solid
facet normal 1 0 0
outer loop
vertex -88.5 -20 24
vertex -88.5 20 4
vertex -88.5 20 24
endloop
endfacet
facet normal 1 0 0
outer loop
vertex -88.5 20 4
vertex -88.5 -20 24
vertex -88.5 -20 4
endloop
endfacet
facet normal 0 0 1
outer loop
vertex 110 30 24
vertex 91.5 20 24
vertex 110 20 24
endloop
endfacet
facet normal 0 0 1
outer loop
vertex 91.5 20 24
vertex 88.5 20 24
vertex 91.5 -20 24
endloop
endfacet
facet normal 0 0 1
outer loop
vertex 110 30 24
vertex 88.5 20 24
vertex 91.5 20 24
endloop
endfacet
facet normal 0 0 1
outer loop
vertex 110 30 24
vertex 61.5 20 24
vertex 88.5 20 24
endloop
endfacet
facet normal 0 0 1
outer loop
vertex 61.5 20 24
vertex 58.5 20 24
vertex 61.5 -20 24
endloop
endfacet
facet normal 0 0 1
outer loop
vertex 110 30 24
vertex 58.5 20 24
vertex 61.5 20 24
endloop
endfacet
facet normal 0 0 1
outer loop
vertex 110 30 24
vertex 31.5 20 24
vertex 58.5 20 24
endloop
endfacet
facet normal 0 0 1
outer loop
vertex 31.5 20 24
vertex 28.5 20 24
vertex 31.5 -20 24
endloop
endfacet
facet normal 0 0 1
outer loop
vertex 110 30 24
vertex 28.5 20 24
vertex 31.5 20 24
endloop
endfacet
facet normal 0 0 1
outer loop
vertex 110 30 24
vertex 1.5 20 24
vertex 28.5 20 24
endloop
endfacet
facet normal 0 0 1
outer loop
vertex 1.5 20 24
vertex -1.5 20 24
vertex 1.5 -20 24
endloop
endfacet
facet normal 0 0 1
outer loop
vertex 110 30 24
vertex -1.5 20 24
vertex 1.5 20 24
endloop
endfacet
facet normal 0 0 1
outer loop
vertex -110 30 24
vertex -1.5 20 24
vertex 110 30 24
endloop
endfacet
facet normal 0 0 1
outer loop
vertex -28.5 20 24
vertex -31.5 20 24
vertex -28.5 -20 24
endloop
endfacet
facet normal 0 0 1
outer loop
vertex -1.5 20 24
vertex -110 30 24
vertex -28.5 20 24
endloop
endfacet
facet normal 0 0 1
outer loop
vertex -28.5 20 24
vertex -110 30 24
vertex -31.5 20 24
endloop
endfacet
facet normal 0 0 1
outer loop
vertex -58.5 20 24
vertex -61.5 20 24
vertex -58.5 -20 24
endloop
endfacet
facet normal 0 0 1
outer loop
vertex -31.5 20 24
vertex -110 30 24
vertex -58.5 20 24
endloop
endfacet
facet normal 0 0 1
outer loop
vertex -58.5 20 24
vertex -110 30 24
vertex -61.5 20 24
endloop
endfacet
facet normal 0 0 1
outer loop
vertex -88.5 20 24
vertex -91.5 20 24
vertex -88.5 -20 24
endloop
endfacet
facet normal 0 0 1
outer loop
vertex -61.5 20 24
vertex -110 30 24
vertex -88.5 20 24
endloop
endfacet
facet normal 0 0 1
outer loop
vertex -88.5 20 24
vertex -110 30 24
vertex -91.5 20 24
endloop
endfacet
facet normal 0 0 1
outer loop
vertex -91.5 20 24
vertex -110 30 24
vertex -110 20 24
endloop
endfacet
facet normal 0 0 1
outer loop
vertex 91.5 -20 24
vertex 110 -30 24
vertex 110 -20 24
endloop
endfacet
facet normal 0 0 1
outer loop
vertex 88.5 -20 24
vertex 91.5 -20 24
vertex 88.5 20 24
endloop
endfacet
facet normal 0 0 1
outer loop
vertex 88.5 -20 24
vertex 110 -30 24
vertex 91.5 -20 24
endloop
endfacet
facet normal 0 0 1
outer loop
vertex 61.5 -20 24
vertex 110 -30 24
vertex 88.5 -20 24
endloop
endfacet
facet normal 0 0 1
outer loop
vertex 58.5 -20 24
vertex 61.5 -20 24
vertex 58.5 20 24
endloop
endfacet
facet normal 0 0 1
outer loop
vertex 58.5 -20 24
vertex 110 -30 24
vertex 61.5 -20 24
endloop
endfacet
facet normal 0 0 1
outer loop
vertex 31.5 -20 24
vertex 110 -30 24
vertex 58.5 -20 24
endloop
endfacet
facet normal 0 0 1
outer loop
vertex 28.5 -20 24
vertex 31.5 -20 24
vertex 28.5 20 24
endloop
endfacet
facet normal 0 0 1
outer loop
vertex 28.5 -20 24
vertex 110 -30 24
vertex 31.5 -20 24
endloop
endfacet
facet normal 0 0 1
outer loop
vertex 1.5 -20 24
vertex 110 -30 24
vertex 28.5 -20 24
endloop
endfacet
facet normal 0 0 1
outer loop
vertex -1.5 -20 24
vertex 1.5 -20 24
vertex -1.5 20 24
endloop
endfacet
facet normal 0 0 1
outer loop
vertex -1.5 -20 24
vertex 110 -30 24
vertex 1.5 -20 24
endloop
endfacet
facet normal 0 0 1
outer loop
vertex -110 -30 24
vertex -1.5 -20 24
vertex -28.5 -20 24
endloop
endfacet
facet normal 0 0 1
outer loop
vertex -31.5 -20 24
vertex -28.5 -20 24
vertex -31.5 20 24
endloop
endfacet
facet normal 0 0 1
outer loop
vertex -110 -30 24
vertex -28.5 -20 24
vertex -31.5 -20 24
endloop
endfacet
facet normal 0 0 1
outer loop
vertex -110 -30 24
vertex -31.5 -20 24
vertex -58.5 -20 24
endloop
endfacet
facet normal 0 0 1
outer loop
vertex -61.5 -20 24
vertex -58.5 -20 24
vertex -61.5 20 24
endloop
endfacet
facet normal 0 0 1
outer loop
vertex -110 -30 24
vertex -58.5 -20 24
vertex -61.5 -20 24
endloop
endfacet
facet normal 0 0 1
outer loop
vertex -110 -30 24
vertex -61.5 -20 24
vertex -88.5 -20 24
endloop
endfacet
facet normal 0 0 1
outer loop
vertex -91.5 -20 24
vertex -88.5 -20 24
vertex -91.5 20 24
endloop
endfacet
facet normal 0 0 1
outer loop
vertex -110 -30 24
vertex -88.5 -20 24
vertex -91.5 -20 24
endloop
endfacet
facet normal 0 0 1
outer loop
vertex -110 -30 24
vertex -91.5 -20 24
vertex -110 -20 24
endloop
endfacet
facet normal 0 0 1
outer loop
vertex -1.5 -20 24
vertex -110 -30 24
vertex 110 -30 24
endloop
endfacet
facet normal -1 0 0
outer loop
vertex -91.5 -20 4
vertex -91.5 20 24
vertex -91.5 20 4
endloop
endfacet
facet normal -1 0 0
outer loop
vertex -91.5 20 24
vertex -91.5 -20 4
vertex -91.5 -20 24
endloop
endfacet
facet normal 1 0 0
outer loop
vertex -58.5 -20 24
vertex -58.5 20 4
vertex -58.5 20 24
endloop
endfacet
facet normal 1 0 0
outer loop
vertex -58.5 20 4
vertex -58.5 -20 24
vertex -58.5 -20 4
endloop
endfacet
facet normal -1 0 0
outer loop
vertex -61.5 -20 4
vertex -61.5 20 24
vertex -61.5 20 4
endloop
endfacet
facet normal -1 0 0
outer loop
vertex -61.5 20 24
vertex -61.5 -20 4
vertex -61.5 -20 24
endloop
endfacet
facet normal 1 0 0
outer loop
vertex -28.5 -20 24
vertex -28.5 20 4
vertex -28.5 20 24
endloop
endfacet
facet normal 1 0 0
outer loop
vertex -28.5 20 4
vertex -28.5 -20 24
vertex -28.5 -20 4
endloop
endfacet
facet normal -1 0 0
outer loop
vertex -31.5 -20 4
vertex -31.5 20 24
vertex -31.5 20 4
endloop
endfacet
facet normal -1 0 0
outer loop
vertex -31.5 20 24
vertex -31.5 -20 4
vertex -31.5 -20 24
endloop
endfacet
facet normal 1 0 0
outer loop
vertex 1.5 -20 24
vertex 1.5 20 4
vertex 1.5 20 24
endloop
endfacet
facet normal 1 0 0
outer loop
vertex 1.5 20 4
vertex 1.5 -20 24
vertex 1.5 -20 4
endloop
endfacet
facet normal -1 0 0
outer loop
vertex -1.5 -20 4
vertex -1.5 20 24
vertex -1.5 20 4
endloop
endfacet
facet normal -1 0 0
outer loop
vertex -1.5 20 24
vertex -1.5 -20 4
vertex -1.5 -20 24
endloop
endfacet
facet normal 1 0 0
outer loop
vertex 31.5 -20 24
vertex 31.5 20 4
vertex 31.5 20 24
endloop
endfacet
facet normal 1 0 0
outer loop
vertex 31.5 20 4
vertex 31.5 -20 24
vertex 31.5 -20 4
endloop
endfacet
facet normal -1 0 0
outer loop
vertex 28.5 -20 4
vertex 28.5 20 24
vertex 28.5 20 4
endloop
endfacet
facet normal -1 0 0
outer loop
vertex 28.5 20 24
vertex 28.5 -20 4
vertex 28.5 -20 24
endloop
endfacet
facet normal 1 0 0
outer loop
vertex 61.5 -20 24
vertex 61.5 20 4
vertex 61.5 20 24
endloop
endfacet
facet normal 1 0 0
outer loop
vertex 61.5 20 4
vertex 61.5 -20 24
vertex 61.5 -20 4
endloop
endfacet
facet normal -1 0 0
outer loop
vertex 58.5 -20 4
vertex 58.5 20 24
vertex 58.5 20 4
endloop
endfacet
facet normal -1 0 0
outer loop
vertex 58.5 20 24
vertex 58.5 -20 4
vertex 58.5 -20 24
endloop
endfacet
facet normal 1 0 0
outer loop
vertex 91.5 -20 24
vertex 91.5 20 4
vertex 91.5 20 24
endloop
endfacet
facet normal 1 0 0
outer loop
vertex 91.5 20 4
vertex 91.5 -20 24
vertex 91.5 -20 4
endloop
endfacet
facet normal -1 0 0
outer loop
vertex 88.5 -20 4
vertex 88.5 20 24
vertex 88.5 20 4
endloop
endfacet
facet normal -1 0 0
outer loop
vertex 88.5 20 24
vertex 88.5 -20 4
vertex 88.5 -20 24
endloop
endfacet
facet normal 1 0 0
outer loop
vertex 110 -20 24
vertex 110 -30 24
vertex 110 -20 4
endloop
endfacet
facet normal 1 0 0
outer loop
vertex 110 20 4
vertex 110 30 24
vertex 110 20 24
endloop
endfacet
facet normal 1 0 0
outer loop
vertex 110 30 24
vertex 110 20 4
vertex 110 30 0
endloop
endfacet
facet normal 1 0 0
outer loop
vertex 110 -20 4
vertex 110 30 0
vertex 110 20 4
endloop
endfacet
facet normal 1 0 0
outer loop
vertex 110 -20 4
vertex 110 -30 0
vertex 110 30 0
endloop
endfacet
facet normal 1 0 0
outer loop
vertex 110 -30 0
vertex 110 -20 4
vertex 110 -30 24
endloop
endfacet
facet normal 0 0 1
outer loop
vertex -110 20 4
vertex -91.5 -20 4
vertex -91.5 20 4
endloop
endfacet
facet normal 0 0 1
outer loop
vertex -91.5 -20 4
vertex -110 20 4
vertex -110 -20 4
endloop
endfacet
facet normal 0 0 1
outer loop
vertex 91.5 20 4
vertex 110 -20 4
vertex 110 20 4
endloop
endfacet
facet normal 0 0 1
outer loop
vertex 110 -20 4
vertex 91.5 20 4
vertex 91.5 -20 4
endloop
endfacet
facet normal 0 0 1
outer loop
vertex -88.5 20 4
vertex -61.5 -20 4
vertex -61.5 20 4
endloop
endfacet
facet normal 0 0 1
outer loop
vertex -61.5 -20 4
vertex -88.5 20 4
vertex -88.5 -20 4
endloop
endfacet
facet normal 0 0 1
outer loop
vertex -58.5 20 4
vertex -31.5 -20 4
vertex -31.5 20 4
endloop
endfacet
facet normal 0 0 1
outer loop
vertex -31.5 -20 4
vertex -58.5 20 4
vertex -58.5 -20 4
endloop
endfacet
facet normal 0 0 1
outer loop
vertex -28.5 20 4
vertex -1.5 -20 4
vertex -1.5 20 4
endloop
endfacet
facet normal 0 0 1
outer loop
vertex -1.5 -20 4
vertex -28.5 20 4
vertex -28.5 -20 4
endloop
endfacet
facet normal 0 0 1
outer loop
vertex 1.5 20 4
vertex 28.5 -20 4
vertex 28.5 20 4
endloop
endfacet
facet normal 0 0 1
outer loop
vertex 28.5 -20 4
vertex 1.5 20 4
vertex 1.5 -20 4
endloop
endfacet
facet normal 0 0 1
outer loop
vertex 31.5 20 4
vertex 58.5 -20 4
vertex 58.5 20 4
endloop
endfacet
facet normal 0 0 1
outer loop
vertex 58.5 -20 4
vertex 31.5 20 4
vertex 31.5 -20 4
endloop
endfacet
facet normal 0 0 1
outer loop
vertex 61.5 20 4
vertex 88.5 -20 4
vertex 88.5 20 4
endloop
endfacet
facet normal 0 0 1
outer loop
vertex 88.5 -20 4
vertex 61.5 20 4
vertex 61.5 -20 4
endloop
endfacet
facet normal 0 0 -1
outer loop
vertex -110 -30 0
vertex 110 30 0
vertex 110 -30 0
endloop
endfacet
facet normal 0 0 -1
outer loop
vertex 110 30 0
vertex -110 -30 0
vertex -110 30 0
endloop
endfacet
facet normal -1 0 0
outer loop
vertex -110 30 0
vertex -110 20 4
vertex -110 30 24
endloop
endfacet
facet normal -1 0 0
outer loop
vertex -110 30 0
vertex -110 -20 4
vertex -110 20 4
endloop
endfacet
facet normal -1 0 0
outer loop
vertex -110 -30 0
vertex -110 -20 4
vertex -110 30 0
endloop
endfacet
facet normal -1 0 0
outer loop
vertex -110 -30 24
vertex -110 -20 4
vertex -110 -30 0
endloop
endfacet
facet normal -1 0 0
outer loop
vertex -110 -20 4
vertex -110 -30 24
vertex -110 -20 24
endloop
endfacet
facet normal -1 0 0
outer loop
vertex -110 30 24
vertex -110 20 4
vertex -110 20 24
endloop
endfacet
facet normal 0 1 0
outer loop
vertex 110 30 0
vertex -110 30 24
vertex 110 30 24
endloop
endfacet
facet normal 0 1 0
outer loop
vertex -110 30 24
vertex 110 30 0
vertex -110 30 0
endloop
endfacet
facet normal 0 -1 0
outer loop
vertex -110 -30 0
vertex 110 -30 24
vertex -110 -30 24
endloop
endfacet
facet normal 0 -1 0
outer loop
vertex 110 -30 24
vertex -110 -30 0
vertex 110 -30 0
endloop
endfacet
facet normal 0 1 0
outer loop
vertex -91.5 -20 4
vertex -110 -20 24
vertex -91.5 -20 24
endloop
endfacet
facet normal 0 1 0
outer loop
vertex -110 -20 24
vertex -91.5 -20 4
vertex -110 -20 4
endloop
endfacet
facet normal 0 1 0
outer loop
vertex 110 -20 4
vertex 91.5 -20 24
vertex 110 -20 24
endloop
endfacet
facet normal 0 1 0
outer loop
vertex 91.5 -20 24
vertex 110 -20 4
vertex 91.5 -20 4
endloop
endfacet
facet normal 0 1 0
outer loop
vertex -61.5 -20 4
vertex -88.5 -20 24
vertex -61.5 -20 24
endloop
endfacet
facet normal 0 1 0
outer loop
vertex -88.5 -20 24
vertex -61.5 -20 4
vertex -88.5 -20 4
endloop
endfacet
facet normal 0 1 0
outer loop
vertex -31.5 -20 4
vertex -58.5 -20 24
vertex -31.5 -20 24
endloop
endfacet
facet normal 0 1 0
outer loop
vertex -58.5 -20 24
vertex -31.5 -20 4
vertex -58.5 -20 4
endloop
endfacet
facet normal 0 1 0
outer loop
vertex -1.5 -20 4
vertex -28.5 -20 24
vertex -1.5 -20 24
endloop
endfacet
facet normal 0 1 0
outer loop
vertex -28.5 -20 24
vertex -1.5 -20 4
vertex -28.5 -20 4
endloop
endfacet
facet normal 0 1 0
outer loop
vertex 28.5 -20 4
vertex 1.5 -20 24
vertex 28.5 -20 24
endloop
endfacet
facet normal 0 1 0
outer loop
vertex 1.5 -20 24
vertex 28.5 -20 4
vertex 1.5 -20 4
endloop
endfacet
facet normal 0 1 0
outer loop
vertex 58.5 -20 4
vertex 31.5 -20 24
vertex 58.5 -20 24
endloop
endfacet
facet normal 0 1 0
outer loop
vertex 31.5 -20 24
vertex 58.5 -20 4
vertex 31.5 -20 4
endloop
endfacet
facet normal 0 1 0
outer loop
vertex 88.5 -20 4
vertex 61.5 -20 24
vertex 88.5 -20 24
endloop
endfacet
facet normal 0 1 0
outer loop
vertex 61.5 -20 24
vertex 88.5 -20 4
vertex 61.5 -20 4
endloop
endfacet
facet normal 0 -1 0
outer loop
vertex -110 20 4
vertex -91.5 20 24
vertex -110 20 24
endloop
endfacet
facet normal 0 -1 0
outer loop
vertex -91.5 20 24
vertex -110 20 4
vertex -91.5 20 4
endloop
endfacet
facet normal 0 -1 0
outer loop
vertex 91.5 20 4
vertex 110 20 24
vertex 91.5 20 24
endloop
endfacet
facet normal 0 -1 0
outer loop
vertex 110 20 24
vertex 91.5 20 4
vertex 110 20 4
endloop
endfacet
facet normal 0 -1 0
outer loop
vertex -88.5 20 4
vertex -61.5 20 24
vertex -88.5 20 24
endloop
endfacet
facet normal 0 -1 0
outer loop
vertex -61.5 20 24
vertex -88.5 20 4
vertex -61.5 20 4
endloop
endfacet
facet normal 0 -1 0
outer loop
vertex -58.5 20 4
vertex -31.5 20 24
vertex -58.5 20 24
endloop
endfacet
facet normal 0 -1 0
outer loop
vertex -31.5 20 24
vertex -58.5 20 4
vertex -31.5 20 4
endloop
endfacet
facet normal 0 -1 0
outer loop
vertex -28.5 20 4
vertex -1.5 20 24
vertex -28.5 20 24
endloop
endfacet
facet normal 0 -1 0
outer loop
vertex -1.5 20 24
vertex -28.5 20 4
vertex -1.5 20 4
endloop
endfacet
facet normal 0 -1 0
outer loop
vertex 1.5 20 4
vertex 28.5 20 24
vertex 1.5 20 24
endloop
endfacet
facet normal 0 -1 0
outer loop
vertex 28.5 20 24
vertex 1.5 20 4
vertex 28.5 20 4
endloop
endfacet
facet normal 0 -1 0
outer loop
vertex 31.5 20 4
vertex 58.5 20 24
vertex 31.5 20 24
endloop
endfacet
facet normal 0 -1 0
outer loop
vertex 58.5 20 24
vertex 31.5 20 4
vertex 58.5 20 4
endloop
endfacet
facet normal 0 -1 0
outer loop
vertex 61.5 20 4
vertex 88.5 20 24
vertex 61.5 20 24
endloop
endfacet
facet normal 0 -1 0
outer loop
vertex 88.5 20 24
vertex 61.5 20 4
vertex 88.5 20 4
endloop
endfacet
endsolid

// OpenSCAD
$fn = 32;

// ----------------------------------------------------------------------
// Rib frame 220 x 60 x 24
// 7 ribs at 30 mm pitch
// ----------------------------------------------------------------------

// --- parameters (mm) ---
frame = [220, 60, 4];  // base plate size (x, y, z)
rail_w = 10;           // side rail width
ribs = 7;              // number of ribs
rib_t = 3;             // rib thickness
rib_h = 20;            // rib height above the base plate
pitch = 30;            // pitch between rib centres

// --- derived feature positions (mm) ---
span = (ribs - 1) * pitch;          // = 180   distance between the outer ribs
origin_x = -span / 2;               // = -90   X of the first rib
rib_len = frame[1] - 2 * rail_w + 2;  // = 42   rib length, 1 mm into each rail
feature_centers = [
  [origin_x + 0 * pitch, 0],
  [origin_x + 1 * pitch, 0],
  [origin_x + 2 * pitch, 0],
  [origin_x + 3 * pitch, 0],
  [origin_x + 4 * pitch, 0],
  [origin_x + 5 * pitch, 0],
  [origin_x + 6 * pitch, 0]
];   // rib centre line, drives the rib loop

// base plate, two side rails, then the ribs read straight off feature_centers
union() {
  translate([-frame[0] / 2, -frame[1] / 2, 0]) cube(frame);
  translate([-frame[0] / 2, -frame[1] / 2, 0]) cube([frame[0], rail_w, frame[2] + rib_h]);
  translate([-frame[0] / 2, frame[1] / 2 - rail_w, 0]) cube([frame[0], rail_w, frame[2] + rib_h]);
  for (centre = feature_centers)
    translate([centre[0] - rib_t / 2, centre[1] - rib_len / 2, frame[2] - 1])
      cube([rib_t, rib_len, rib_h + 1]);
}
